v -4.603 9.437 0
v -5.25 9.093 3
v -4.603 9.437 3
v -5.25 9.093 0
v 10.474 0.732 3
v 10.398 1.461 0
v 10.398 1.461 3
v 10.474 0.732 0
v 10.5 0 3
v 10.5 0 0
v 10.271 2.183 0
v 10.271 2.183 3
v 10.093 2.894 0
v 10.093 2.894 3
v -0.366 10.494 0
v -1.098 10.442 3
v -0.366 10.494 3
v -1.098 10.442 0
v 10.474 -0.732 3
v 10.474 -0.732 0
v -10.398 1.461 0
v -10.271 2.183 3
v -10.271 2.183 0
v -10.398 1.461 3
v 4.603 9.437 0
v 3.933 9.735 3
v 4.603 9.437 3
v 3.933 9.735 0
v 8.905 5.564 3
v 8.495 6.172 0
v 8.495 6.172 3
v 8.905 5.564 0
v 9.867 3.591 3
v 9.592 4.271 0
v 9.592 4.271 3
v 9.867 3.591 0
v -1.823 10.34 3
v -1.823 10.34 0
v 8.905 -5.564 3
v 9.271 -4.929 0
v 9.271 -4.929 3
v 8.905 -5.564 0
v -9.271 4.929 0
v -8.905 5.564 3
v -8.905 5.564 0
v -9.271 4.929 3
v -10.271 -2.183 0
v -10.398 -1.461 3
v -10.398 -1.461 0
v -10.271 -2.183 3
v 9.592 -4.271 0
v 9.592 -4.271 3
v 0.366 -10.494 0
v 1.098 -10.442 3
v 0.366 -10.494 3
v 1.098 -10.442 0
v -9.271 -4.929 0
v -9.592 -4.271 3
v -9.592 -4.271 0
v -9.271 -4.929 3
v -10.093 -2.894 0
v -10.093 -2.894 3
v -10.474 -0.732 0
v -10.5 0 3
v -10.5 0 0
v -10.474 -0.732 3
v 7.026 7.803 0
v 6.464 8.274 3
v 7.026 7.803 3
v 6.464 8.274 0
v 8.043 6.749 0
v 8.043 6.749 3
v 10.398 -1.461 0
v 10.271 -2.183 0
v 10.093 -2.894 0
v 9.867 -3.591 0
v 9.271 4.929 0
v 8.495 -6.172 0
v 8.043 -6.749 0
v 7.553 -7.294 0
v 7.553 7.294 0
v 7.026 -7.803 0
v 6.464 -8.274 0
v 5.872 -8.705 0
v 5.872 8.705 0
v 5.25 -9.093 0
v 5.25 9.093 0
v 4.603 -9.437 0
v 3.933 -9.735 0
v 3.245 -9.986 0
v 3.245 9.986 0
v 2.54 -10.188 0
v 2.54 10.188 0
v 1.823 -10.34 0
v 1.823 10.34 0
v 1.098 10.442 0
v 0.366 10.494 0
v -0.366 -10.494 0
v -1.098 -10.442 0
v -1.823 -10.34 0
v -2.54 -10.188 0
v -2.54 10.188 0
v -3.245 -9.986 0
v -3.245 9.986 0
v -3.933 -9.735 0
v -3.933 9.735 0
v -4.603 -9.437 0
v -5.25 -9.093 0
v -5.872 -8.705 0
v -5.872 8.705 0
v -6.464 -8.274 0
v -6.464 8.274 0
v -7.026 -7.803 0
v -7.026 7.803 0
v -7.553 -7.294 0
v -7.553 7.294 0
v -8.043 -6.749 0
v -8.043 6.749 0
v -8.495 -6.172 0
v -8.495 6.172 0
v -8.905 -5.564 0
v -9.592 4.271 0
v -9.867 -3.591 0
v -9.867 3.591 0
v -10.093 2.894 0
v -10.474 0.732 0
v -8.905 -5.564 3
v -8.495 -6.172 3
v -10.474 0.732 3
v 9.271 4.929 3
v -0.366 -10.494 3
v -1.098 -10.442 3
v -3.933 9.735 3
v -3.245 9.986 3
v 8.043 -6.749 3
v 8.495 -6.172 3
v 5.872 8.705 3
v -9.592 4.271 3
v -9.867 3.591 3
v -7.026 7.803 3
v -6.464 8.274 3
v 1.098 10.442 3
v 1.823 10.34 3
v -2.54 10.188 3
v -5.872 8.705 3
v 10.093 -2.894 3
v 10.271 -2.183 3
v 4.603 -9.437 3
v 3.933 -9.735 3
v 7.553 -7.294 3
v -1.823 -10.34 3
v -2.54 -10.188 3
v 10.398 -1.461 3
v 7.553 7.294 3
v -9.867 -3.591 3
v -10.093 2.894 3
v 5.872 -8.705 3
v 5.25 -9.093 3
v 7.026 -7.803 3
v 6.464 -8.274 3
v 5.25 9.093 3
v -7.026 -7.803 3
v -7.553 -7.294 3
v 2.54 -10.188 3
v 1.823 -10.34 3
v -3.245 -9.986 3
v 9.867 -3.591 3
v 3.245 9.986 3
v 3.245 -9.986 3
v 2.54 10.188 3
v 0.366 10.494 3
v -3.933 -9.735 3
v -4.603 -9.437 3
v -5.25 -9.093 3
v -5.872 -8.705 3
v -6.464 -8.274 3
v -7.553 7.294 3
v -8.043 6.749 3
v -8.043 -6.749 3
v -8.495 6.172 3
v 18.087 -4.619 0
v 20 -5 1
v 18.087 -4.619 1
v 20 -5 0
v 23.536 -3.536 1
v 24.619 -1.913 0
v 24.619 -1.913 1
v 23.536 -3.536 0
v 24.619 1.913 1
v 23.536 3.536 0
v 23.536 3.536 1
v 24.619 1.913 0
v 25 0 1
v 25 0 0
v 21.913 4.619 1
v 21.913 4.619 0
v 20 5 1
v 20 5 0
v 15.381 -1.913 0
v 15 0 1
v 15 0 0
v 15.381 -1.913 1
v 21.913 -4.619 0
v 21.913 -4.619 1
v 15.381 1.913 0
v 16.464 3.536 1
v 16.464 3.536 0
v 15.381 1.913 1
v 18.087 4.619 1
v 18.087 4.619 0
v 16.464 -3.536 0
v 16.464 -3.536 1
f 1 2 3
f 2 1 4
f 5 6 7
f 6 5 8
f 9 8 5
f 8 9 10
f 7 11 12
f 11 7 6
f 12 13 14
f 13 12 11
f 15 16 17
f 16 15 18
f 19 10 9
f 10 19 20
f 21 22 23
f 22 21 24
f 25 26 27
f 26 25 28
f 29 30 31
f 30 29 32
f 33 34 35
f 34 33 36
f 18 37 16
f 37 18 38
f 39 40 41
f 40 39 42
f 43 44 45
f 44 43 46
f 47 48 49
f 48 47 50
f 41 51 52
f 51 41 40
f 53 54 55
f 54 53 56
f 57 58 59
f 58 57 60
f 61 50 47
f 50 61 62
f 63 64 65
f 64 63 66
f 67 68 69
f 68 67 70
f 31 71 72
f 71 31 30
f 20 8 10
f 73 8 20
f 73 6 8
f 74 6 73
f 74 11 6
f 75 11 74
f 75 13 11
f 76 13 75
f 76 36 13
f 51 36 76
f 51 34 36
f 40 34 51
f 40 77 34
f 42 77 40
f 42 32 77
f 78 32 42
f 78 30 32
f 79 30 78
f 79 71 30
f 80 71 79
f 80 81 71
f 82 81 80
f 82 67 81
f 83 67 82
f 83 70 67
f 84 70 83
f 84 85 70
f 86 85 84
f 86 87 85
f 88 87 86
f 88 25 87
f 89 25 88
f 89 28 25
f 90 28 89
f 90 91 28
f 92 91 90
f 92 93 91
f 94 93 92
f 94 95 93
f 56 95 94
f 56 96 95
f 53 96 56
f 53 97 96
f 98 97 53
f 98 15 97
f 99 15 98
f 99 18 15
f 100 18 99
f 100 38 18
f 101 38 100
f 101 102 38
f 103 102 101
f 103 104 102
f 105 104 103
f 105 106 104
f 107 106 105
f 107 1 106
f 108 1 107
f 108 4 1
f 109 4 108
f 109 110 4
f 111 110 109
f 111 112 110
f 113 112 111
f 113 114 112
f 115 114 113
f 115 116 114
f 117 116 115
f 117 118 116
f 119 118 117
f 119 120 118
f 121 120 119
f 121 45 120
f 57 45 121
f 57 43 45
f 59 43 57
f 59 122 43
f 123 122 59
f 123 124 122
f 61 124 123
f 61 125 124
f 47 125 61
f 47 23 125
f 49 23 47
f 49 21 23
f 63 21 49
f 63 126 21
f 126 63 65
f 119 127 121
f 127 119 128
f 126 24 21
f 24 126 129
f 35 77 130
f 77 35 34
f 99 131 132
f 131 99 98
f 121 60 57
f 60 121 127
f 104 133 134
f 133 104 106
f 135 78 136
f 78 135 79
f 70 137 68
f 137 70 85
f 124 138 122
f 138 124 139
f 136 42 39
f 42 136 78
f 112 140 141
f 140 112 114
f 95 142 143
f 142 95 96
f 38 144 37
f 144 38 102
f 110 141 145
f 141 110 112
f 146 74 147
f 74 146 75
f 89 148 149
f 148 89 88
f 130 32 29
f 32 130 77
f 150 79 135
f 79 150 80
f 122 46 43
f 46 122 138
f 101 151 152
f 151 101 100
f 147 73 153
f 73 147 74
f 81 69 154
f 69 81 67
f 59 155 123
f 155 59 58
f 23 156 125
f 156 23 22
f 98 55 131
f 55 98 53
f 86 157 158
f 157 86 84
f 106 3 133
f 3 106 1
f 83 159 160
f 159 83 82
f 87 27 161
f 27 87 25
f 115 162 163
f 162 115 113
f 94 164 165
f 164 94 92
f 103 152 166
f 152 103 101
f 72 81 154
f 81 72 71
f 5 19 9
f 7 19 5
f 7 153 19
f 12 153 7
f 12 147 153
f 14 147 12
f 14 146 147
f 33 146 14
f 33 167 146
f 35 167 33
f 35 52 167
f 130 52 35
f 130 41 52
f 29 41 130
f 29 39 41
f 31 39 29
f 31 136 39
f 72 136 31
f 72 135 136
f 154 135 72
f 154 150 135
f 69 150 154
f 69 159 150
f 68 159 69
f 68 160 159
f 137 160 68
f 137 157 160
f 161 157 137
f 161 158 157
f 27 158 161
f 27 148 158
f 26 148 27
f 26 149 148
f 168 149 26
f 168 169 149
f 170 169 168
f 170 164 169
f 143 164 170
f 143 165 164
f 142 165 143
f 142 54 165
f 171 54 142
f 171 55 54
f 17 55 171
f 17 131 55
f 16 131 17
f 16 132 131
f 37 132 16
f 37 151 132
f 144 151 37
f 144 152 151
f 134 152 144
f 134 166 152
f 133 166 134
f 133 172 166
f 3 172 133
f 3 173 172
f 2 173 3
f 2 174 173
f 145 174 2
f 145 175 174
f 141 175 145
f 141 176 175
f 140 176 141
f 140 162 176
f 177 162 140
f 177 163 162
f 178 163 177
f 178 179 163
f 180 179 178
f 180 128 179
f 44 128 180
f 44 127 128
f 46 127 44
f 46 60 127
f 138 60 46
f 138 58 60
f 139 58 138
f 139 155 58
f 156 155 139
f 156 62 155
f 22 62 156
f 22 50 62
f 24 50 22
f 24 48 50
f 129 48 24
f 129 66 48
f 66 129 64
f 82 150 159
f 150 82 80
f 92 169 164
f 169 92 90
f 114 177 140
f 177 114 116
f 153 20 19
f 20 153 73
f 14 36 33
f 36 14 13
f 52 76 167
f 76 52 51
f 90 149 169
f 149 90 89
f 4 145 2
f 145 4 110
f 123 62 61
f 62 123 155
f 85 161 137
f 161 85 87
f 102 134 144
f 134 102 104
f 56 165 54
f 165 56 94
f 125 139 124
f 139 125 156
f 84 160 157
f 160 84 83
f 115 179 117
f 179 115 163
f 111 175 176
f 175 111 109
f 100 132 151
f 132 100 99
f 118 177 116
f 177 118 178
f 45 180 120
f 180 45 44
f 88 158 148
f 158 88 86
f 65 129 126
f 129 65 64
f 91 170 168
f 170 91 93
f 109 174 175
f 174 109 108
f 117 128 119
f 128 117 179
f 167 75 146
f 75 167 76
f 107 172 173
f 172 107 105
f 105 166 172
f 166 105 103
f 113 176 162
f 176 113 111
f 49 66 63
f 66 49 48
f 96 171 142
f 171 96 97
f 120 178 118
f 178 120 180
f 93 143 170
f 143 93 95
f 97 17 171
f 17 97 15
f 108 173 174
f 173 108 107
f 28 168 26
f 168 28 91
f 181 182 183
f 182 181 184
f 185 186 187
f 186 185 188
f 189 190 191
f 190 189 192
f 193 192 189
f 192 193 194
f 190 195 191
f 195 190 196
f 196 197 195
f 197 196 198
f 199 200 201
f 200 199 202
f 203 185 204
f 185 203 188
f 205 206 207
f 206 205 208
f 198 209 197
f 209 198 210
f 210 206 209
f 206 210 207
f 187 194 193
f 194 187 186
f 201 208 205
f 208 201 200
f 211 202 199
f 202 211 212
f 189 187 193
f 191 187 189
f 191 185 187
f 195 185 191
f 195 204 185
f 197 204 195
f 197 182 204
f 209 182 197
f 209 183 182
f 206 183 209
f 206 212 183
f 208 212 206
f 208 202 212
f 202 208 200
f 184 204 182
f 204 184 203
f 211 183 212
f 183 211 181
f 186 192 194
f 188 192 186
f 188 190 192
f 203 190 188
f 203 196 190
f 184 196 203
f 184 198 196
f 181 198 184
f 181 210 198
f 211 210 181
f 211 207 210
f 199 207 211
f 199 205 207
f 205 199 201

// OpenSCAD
cylinder(r = 10.5, h = 3, $fn = 90);

translate([20,0,0])
color("green")
cylinder(r = 5);
